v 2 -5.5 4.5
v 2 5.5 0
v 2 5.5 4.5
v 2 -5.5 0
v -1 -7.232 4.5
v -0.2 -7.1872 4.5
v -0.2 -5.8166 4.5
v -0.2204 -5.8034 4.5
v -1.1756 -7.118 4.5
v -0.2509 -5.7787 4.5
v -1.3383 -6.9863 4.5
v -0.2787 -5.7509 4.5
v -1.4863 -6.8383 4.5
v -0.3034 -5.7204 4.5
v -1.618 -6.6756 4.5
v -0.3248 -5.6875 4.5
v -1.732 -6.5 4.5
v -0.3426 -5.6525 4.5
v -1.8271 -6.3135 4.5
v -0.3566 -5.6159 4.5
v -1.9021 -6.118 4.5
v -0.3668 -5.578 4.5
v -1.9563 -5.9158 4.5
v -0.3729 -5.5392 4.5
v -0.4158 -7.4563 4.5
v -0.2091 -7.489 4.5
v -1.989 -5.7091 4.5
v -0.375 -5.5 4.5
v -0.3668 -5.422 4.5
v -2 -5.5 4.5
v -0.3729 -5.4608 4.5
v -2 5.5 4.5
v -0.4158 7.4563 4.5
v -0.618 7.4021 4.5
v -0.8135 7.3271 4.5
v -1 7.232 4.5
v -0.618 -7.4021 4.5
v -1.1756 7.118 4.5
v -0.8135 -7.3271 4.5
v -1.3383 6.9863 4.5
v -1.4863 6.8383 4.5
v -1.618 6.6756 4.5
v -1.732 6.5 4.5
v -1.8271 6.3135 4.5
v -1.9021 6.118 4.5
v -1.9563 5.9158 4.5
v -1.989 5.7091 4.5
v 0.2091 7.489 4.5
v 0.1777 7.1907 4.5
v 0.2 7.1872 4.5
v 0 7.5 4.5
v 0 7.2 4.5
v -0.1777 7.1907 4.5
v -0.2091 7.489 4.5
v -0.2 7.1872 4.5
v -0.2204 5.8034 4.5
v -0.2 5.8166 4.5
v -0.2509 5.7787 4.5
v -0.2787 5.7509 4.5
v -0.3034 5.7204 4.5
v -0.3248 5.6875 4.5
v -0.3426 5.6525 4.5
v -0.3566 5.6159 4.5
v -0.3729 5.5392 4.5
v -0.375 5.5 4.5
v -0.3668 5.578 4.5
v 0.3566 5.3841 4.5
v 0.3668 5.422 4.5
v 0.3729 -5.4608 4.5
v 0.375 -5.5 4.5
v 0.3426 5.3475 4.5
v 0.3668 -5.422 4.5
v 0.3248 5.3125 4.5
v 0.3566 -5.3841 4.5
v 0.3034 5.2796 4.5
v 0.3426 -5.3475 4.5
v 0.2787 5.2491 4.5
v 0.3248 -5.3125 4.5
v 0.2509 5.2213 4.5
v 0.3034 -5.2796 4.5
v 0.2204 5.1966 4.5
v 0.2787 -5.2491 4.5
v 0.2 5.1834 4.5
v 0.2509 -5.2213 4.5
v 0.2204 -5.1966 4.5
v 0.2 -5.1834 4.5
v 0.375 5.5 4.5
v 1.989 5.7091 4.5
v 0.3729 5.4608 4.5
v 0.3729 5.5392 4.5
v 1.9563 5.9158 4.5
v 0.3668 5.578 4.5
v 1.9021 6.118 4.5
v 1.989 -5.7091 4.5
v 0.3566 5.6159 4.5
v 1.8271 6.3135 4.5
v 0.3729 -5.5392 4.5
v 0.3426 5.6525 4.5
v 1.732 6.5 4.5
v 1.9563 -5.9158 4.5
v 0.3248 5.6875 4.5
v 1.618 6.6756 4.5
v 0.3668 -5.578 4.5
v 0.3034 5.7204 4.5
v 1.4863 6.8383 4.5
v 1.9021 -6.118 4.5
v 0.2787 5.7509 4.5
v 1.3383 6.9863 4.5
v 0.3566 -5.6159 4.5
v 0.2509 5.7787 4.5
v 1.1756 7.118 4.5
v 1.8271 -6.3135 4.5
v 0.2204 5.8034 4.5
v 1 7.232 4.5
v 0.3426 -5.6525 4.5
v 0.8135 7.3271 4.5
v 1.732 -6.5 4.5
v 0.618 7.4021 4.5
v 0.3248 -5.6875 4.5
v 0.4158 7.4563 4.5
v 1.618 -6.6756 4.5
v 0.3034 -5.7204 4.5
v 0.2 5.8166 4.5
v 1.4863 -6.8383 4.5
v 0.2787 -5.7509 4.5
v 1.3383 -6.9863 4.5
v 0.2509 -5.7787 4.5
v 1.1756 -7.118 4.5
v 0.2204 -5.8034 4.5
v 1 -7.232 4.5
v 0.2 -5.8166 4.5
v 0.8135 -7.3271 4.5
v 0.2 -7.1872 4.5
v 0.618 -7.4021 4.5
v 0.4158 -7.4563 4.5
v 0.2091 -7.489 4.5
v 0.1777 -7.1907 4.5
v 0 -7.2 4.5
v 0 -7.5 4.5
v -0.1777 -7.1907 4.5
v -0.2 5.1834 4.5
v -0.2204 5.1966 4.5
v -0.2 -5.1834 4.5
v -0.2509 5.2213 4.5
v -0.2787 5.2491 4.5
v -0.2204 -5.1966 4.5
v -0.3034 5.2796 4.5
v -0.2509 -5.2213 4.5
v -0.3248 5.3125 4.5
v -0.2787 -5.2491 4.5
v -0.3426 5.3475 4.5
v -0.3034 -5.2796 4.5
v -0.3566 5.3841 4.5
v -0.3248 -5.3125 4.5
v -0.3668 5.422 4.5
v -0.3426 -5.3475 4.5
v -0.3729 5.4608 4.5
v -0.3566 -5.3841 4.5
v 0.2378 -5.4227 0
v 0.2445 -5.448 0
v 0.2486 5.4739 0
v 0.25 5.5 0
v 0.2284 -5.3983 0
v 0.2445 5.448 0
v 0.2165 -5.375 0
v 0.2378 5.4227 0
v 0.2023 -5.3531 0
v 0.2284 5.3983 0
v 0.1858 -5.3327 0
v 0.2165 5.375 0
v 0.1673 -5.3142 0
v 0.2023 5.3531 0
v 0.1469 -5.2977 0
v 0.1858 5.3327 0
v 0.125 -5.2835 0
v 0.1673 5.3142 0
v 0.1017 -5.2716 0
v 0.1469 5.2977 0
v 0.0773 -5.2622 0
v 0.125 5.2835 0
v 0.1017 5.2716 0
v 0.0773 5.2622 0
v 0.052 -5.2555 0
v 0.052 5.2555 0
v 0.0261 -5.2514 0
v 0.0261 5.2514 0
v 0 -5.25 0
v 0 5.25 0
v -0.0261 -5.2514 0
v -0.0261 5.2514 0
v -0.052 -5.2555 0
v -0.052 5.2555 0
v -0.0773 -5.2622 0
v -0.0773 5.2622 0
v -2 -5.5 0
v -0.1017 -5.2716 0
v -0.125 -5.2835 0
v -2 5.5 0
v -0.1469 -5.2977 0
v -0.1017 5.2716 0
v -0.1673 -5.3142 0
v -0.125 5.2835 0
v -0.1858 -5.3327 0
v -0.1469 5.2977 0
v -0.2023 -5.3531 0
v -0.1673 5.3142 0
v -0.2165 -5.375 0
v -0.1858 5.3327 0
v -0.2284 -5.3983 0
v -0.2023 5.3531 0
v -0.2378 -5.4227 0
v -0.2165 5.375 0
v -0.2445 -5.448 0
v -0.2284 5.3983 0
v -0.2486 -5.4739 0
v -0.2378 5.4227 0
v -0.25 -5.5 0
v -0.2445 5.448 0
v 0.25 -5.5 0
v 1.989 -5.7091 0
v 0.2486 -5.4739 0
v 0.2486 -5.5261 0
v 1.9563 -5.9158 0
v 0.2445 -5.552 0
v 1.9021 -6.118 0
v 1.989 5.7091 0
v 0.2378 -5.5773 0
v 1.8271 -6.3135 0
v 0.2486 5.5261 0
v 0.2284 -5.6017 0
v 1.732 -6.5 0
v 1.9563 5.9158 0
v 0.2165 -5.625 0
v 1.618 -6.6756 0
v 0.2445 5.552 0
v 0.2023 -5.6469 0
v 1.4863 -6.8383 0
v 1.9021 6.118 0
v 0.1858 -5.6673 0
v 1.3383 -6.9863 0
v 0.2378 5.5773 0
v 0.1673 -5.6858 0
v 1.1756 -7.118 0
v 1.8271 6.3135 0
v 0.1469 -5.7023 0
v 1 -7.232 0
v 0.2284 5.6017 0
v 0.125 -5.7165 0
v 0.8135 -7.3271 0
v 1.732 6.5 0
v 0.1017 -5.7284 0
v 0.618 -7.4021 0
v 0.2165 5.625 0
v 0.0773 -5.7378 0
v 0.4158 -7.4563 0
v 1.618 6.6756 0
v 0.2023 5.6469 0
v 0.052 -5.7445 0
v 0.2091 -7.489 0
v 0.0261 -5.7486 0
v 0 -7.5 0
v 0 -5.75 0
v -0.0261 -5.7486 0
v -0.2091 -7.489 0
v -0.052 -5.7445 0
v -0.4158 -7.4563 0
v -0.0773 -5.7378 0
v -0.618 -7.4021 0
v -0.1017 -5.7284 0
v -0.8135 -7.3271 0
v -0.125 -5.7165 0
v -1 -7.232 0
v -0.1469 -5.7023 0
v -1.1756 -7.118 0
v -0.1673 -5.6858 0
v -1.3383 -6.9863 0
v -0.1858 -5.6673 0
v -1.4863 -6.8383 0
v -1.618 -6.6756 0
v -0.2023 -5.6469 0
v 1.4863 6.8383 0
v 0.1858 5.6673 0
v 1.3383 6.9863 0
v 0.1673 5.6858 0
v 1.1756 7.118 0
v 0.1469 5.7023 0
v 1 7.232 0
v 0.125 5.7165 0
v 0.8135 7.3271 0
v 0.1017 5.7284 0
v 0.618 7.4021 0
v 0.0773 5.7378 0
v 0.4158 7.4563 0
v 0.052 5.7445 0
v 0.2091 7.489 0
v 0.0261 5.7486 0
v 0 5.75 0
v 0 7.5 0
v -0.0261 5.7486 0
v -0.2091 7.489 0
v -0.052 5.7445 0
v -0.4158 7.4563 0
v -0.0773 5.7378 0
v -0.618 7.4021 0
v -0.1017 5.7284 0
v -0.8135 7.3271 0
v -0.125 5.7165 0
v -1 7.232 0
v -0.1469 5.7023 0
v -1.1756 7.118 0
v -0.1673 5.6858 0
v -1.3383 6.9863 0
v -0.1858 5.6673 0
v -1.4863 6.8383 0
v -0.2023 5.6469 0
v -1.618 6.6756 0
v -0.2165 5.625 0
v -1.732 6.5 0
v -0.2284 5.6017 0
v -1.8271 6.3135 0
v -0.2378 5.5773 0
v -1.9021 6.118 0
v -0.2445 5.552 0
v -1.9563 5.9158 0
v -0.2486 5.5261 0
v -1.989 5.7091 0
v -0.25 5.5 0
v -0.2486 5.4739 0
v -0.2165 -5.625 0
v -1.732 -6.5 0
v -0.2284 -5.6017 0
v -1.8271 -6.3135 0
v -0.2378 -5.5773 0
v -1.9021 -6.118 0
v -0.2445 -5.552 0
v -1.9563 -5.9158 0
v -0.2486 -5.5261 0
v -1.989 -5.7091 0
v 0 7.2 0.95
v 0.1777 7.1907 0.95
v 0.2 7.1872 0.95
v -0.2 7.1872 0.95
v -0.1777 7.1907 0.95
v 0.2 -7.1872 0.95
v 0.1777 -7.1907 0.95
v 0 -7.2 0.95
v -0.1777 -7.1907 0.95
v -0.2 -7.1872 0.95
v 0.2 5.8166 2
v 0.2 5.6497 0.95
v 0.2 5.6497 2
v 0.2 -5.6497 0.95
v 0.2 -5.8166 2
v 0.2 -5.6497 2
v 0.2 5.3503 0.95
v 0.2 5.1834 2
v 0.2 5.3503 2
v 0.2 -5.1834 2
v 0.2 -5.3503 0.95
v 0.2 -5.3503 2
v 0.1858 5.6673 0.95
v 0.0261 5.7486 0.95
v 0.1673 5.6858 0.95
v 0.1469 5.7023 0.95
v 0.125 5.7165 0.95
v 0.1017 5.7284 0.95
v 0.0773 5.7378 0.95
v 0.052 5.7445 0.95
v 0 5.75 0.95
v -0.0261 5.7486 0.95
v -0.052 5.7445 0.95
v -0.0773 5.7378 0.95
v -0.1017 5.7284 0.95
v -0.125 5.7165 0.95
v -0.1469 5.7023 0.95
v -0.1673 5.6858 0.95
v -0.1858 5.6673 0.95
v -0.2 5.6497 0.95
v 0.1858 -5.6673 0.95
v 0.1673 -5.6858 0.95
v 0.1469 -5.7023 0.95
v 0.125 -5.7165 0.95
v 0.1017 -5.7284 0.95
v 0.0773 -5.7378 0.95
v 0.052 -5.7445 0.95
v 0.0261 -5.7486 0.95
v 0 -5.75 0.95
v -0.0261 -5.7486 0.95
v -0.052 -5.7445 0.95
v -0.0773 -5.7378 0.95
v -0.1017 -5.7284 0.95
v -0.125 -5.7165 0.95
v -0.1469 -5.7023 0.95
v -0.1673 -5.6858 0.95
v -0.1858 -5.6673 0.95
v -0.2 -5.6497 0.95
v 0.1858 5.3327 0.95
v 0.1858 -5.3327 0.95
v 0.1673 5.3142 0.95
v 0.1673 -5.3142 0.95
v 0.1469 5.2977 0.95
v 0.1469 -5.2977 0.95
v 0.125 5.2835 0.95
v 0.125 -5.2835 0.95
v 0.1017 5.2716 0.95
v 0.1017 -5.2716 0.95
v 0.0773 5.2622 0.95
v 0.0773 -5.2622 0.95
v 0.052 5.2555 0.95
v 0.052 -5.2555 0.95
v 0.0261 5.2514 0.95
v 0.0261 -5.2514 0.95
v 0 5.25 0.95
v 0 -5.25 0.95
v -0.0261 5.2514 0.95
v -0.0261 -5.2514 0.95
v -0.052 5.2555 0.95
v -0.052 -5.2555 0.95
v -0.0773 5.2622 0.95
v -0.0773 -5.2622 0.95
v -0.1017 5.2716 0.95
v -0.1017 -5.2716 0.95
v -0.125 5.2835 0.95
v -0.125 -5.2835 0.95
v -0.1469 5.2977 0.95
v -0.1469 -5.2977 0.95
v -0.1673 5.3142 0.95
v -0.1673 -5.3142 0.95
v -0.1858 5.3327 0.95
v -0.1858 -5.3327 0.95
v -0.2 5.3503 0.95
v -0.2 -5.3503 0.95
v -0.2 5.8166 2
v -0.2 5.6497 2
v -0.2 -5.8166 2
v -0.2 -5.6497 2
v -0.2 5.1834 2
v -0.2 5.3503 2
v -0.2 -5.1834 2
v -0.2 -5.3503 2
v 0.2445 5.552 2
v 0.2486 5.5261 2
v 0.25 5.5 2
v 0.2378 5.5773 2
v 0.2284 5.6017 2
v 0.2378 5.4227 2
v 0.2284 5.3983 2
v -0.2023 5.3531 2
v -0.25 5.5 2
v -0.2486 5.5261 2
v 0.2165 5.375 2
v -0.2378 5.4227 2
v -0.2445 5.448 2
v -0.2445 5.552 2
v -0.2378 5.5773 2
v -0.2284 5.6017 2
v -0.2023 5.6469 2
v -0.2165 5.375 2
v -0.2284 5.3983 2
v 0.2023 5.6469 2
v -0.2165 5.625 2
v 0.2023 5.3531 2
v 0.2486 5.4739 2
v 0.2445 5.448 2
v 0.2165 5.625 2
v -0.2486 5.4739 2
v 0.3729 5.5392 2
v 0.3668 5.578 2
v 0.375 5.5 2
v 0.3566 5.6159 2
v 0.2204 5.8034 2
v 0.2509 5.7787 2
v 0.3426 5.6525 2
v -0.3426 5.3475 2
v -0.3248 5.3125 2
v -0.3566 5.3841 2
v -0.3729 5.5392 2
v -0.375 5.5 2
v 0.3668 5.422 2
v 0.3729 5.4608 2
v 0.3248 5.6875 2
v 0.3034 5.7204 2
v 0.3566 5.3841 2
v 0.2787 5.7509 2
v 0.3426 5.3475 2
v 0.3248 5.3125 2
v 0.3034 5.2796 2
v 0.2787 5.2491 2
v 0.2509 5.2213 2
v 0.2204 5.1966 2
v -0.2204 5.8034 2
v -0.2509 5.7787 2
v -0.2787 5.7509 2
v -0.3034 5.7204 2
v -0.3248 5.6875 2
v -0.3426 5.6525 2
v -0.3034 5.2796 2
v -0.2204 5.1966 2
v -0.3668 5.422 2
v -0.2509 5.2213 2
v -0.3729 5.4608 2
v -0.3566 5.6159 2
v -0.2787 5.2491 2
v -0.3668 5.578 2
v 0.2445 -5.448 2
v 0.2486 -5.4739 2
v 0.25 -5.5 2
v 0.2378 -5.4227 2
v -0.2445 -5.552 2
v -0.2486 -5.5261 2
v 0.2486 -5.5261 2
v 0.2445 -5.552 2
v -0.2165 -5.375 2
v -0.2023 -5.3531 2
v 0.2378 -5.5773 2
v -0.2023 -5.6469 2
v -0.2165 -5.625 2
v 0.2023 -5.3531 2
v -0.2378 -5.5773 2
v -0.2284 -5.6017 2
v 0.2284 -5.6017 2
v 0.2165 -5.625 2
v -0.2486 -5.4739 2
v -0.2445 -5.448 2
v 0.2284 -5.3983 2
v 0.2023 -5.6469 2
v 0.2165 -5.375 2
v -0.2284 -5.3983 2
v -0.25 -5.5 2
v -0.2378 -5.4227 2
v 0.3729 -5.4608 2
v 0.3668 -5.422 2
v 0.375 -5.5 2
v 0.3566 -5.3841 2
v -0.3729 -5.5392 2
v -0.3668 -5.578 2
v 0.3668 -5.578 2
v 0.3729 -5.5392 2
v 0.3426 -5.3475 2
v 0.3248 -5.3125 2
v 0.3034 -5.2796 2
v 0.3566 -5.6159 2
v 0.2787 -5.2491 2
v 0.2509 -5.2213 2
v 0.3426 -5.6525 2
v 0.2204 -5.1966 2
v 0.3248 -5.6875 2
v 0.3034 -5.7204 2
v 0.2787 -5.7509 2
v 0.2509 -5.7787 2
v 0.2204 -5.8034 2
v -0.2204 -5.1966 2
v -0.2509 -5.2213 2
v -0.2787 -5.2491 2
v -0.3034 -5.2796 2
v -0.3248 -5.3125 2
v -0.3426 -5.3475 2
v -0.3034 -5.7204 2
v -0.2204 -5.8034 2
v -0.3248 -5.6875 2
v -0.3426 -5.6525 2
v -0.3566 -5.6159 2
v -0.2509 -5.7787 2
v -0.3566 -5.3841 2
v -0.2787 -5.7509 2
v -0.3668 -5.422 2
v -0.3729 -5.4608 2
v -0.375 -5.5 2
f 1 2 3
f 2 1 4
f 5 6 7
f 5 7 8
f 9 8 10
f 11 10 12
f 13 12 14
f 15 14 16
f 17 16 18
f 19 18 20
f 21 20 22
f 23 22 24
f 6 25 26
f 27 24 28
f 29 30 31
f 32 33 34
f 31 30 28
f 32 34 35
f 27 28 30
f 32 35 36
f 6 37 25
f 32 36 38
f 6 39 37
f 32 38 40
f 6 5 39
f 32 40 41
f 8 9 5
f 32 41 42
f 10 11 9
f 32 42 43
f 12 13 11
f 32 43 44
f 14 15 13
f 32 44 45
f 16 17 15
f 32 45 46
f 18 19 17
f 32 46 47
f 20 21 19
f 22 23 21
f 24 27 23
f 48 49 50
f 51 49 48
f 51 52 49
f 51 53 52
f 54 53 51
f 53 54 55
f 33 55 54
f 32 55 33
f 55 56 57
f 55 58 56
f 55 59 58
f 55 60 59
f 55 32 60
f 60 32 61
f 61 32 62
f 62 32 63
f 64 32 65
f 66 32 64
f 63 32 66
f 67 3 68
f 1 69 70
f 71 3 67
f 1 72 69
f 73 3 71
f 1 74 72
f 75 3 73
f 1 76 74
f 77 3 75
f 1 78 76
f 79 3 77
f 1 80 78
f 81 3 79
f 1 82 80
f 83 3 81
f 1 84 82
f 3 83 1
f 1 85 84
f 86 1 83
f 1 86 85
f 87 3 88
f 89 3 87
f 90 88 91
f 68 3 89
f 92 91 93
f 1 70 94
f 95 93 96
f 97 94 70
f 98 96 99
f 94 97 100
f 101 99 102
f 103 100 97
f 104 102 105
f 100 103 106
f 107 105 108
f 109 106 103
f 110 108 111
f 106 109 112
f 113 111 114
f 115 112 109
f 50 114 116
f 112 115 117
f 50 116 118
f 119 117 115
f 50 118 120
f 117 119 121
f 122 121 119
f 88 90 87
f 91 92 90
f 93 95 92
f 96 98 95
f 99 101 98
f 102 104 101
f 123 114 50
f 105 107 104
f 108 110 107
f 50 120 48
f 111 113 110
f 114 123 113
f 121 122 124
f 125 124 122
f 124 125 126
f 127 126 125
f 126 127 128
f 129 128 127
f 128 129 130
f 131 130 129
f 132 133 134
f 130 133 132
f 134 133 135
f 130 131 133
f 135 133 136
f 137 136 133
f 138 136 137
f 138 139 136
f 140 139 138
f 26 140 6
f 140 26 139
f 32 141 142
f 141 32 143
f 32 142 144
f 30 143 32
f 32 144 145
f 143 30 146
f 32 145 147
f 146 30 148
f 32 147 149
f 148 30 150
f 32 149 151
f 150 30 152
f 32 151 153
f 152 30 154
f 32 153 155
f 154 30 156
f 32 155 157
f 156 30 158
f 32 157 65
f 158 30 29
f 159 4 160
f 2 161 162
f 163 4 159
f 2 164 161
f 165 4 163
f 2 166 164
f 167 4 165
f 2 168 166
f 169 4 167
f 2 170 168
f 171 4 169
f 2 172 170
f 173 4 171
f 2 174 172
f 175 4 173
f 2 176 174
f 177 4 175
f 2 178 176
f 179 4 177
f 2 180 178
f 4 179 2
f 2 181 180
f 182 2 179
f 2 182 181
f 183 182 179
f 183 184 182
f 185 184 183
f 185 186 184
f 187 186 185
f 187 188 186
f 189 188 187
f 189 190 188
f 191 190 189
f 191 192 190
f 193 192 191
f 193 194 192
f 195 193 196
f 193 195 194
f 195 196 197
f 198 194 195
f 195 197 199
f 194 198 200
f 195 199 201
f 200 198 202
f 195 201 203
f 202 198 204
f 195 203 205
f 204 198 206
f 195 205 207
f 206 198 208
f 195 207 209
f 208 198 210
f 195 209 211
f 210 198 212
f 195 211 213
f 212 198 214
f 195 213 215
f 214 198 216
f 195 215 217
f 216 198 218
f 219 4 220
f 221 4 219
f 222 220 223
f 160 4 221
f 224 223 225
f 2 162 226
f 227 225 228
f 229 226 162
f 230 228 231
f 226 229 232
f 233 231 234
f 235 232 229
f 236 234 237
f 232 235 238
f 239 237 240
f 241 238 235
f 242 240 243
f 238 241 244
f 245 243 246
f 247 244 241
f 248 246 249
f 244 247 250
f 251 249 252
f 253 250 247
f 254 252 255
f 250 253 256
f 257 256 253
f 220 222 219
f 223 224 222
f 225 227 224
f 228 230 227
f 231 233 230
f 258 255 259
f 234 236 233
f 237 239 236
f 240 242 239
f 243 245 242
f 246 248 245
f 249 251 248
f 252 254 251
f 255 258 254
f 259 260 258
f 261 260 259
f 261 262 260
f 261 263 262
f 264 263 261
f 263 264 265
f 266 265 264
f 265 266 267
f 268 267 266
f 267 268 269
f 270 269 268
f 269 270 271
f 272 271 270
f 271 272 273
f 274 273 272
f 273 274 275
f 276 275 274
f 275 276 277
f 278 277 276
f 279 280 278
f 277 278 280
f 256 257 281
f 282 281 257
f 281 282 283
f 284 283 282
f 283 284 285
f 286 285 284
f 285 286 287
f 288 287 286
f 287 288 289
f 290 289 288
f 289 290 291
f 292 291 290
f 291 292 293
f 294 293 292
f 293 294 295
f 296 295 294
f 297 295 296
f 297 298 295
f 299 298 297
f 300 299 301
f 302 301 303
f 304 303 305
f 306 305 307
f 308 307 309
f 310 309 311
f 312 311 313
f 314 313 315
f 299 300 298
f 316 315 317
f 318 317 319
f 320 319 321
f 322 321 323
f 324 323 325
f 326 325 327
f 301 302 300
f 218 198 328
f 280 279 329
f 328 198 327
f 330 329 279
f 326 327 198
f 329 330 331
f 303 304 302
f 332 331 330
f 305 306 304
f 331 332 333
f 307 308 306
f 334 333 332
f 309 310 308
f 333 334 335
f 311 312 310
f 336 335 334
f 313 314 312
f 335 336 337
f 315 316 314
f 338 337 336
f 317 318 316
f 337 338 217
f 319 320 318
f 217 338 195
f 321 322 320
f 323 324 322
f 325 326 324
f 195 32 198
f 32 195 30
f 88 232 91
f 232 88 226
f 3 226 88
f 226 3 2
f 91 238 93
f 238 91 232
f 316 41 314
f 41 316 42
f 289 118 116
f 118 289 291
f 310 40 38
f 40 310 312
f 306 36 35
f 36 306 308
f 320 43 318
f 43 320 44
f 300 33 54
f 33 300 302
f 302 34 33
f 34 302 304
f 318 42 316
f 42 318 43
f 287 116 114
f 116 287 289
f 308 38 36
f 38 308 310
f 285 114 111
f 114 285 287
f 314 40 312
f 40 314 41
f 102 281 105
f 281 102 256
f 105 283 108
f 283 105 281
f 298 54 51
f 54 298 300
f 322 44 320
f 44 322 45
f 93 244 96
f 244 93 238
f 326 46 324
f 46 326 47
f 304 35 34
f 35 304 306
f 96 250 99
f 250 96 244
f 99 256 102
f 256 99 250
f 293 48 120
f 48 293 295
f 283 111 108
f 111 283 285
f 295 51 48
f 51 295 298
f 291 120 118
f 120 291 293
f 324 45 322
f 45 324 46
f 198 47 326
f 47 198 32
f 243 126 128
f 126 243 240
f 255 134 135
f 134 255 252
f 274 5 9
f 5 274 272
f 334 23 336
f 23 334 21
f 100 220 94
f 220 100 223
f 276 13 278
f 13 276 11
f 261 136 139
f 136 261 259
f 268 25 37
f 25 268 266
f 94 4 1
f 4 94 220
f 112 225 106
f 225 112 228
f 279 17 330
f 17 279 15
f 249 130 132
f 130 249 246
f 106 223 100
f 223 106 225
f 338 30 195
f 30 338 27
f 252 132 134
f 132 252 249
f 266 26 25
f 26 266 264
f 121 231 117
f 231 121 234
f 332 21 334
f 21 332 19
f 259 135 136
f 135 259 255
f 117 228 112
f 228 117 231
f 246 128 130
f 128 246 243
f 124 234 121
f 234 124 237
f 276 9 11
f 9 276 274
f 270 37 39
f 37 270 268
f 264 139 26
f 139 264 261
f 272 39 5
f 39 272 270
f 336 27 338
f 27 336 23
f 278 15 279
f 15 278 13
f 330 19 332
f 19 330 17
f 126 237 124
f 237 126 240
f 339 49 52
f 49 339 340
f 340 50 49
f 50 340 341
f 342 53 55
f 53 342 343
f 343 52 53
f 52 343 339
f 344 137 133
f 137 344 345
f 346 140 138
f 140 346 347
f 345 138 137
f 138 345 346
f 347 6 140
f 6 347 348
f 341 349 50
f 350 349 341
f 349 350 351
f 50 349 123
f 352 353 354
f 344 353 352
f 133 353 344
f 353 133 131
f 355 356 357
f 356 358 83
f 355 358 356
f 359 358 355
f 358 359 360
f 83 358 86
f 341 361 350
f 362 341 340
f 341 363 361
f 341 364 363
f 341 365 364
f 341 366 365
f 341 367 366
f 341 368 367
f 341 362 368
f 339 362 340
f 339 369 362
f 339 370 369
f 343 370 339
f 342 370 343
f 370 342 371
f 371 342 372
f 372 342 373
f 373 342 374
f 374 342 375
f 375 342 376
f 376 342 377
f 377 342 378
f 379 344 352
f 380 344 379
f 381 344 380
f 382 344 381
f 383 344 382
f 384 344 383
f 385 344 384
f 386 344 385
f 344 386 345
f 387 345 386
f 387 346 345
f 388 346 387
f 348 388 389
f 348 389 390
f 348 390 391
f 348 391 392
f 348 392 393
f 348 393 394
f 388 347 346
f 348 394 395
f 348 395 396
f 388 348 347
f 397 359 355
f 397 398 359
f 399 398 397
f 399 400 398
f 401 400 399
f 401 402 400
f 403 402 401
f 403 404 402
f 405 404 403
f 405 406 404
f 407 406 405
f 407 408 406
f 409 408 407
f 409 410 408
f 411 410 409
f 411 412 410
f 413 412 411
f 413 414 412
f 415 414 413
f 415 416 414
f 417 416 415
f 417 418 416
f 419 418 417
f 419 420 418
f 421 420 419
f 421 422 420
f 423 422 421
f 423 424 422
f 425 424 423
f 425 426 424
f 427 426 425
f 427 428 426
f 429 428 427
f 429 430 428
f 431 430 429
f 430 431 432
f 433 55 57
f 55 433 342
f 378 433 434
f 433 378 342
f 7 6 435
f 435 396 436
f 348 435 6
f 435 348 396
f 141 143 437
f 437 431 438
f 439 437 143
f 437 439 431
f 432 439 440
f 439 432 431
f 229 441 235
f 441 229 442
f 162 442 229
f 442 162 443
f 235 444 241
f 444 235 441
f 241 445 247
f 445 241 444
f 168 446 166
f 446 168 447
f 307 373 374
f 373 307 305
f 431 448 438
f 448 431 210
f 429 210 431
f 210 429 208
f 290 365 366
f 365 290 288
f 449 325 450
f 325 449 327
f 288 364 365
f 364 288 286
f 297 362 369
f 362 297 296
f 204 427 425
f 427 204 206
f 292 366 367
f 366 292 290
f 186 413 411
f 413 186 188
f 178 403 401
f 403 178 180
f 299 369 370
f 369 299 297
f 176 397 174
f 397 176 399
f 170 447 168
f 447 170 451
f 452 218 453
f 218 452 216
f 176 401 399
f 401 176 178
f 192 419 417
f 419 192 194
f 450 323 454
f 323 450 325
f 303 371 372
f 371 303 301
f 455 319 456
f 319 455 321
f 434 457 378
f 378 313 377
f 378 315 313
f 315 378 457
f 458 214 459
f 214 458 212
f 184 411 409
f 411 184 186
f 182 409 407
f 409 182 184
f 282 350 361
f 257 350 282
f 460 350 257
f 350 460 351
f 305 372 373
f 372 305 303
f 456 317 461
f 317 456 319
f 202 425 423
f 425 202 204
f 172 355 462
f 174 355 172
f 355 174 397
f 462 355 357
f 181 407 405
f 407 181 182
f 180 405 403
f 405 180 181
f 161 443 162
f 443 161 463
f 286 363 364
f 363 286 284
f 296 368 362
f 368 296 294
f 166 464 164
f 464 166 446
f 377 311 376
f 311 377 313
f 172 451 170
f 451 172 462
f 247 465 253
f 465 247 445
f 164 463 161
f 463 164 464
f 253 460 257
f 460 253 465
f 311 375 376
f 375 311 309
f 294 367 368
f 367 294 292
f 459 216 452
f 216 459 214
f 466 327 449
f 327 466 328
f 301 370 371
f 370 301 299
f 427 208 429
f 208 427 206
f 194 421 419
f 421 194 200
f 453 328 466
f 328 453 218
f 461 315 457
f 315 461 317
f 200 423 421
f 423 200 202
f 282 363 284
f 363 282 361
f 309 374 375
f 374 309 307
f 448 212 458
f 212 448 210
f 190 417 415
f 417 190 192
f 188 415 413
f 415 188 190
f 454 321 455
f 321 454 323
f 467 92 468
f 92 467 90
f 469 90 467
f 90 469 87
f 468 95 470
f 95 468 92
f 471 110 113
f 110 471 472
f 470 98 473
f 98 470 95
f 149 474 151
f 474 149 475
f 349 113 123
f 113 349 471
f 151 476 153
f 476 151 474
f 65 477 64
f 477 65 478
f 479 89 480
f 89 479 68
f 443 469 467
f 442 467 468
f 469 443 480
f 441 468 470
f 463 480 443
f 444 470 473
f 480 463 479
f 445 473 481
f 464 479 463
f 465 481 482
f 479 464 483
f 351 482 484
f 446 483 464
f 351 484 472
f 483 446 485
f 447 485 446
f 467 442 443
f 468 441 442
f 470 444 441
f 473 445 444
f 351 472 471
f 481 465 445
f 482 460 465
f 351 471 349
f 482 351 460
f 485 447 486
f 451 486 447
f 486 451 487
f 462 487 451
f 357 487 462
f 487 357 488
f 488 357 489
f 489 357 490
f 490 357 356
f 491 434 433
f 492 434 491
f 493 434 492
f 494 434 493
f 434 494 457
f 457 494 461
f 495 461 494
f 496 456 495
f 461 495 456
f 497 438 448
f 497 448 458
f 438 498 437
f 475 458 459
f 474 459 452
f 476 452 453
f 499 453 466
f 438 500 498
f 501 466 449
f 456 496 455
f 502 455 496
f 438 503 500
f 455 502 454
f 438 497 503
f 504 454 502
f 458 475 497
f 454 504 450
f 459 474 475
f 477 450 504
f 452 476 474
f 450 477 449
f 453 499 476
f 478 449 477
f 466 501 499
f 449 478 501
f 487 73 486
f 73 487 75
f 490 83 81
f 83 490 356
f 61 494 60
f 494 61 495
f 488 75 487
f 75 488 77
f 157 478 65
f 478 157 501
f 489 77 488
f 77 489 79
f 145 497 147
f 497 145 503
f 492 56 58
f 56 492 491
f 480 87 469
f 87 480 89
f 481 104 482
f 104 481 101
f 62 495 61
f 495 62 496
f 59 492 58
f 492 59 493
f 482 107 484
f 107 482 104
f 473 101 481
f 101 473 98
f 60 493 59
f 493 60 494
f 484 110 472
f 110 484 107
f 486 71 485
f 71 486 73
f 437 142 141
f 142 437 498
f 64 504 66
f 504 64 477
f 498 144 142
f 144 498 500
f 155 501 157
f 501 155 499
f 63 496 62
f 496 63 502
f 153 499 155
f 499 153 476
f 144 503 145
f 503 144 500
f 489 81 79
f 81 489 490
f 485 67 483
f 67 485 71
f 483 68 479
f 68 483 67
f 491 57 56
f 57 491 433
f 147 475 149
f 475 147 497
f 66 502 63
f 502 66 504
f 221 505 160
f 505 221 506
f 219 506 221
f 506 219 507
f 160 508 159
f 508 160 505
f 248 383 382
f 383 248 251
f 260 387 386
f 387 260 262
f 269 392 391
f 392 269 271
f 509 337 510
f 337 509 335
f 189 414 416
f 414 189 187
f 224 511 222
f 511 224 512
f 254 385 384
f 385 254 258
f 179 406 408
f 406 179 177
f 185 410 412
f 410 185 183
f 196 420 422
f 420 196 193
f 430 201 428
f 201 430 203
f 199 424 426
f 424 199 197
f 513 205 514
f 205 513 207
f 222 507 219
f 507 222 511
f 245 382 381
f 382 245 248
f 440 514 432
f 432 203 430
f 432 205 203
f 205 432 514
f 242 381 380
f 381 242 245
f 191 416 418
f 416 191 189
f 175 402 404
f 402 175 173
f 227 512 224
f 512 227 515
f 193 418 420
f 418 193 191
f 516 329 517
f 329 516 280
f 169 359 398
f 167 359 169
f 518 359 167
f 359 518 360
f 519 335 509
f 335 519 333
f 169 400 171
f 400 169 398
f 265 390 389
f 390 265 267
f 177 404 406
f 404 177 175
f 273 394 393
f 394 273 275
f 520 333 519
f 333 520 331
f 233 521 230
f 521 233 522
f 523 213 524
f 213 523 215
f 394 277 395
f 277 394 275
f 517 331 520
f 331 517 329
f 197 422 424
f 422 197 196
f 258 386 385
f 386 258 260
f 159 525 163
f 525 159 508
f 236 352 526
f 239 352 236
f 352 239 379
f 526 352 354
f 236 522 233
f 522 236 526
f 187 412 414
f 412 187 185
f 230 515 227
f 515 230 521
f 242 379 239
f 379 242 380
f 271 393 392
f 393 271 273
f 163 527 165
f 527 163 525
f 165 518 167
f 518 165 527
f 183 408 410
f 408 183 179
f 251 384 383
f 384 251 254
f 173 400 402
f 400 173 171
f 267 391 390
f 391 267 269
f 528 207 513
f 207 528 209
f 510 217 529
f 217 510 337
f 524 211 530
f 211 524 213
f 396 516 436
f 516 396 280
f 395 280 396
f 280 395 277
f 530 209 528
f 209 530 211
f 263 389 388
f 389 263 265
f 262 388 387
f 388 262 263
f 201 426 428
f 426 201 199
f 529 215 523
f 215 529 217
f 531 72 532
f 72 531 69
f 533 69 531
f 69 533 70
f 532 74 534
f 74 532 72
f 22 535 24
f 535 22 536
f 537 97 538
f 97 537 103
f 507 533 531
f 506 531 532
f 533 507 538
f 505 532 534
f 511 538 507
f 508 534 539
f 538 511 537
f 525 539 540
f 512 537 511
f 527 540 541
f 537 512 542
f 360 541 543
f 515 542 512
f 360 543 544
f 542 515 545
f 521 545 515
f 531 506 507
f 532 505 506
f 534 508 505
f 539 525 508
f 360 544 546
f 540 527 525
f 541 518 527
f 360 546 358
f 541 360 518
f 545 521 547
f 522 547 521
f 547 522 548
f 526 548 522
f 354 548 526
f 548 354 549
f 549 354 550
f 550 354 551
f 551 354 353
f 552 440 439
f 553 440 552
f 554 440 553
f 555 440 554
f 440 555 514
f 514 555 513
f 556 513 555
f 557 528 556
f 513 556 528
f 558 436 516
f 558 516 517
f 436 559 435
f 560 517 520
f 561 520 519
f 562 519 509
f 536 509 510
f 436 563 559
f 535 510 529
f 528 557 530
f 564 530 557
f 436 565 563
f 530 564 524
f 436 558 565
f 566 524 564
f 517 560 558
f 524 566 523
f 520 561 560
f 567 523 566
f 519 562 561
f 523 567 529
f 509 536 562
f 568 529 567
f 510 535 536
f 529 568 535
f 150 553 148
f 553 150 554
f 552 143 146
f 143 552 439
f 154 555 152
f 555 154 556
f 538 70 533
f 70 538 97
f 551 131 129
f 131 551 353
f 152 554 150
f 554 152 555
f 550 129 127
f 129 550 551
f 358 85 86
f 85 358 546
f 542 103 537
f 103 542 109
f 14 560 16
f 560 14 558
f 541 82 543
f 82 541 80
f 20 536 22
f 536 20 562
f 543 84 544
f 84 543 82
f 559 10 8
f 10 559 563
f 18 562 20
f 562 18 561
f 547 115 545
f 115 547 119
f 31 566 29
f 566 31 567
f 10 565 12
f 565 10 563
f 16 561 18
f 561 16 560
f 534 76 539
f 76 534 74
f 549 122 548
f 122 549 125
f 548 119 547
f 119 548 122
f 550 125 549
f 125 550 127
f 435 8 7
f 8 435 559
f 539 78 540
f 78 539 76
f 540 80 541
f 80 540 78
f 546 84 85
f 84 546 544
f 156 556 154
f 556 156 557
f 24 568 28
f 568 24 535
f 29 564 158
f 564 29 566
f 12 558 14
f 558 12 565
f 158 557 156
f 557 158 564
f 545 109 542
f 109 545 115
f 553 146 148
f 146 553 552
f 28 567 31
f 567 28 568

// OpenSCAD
//CUSTOMIZER VARIABLES

//Number of slots in holder.
numOfSlots = 1; // [1 : 5]

//Height of the holder.
totalHeight = 4;

//Total length.
totalWidth = 15;

//Space around the edge.
edgeGap = 1;

//Gap size for the keys
keyGap = 0.4;

//Size of hole for screws
screwHoleDiameter = 0.5;

//Size of hoe where screw heads are sunk.
screwHeadDiameter = 0.75;

//CUSTOMIZER END


function getInterp(p) = lookup(p, [[0, -(totalHeight-edgeGap)/2], [(numOfSlots-1)/2, 0], [(numOfSlots-1), (totalHeight-edgeGap)/2]]);

function getGapInterp(p) = lookup(p, [[0, -(totalHeight-edgeGap)/2], [(numOfSlots-1)/2, 0], [(numOfSlots-1), (totalHeight-edgeGap)/2]]);



difference(){
	union() {
	translate([0, 0, 2.25]) cube(size=[totalHeight, totalWidth-totalHeight, 4.5], center=true);
	translate([0, totalWidth/2-totalHeight/2, 0]) cylinder(h=4.5, r1=totalHeight/2, r2=totalHeight/2, $fn=60);
	translate([0, -(totalWidth/2-totalHeight/2), 0]) cylinder(h=4.5, r1=totalHeight/2, r2=totalHeight/2, $fn=60);
	}

	difference(){
		
		if (numOfSlots > 2){
			for (i =[0 : numOfSlots-1]){
				translate([getInterp(i), 0, 2.75]) cube(size=[keyGap, totalWidth, 3.6], center=true);
			}
		}
		if (numOfSlots == 2){
			for (i =[0 : numOfSlots-1]){
				translate([getInterp(i)/1.5, 0, 2.75]) cube(size=[keyGap, totalWidth, 3.6], center=true);
			}
		}
		if (numOfSlots == 1){
			for (i =[0 : numOfSlots-1]){
				translate([0, 0, 2.75]) cube(size=[keyGap, totalWidth, 3.6], center=true);
			}
		}

		difference(){
			translate([0, totalWidth/2-totalHeight/2+2.5, 3]) cube(size=[5, 5, 5], center=true);
			translate([0, totalWidth/2-totalHeight/2, -1]) cylinder(h=7, r1=(totalHeight/2)-edgeGap/2+keyGap/2, r2=(totalHeight/2)-edgeGap/2+keyGap/2, $fn=60);
			}
	
		difference(){
			translate([0, -(totalWidth/2-totalHeight/2)-2.5, 3]) cube(size=[5, 5, 5], center=true);
			translate([0, -(totalWidth/2-totalHeight/2), -1]) cylinder(h=7, r1=(totalHeight/2)-edgeGap/2+keyGap/2, r2=(totalHeight/2)-edgeGap/2+keyGap/2, $fn=60);
			}

	}

	translate([0, totalWidth/2-totalHeight/2, 0]) cylinder(h=15, r1=screwHoleDiameter/2, r2=screwHoleDiameter/2, $fn=60, center=true);
	translate([0, totalWidth/2-totalHeight/2, 2.0]) cylinder(h=15, r1=screwHeadDiameter/2, r2=screwHeadDiameter/2, $fn=60);
	translate([0, -(totalWidth/2-totalHeight/2), 0]) cylinder(h=15, r1=screwHoleDiameter/2, r2=screwHoleDiameter/2, $fn=60, center=true);
	translate([0, -(totalWidth/2-totalHeight/2), 2.0]) cylinder(h=15, r1=screwHeadDiameter/2, r2=screwHeadDiameter/2, $fn=60);	

}
